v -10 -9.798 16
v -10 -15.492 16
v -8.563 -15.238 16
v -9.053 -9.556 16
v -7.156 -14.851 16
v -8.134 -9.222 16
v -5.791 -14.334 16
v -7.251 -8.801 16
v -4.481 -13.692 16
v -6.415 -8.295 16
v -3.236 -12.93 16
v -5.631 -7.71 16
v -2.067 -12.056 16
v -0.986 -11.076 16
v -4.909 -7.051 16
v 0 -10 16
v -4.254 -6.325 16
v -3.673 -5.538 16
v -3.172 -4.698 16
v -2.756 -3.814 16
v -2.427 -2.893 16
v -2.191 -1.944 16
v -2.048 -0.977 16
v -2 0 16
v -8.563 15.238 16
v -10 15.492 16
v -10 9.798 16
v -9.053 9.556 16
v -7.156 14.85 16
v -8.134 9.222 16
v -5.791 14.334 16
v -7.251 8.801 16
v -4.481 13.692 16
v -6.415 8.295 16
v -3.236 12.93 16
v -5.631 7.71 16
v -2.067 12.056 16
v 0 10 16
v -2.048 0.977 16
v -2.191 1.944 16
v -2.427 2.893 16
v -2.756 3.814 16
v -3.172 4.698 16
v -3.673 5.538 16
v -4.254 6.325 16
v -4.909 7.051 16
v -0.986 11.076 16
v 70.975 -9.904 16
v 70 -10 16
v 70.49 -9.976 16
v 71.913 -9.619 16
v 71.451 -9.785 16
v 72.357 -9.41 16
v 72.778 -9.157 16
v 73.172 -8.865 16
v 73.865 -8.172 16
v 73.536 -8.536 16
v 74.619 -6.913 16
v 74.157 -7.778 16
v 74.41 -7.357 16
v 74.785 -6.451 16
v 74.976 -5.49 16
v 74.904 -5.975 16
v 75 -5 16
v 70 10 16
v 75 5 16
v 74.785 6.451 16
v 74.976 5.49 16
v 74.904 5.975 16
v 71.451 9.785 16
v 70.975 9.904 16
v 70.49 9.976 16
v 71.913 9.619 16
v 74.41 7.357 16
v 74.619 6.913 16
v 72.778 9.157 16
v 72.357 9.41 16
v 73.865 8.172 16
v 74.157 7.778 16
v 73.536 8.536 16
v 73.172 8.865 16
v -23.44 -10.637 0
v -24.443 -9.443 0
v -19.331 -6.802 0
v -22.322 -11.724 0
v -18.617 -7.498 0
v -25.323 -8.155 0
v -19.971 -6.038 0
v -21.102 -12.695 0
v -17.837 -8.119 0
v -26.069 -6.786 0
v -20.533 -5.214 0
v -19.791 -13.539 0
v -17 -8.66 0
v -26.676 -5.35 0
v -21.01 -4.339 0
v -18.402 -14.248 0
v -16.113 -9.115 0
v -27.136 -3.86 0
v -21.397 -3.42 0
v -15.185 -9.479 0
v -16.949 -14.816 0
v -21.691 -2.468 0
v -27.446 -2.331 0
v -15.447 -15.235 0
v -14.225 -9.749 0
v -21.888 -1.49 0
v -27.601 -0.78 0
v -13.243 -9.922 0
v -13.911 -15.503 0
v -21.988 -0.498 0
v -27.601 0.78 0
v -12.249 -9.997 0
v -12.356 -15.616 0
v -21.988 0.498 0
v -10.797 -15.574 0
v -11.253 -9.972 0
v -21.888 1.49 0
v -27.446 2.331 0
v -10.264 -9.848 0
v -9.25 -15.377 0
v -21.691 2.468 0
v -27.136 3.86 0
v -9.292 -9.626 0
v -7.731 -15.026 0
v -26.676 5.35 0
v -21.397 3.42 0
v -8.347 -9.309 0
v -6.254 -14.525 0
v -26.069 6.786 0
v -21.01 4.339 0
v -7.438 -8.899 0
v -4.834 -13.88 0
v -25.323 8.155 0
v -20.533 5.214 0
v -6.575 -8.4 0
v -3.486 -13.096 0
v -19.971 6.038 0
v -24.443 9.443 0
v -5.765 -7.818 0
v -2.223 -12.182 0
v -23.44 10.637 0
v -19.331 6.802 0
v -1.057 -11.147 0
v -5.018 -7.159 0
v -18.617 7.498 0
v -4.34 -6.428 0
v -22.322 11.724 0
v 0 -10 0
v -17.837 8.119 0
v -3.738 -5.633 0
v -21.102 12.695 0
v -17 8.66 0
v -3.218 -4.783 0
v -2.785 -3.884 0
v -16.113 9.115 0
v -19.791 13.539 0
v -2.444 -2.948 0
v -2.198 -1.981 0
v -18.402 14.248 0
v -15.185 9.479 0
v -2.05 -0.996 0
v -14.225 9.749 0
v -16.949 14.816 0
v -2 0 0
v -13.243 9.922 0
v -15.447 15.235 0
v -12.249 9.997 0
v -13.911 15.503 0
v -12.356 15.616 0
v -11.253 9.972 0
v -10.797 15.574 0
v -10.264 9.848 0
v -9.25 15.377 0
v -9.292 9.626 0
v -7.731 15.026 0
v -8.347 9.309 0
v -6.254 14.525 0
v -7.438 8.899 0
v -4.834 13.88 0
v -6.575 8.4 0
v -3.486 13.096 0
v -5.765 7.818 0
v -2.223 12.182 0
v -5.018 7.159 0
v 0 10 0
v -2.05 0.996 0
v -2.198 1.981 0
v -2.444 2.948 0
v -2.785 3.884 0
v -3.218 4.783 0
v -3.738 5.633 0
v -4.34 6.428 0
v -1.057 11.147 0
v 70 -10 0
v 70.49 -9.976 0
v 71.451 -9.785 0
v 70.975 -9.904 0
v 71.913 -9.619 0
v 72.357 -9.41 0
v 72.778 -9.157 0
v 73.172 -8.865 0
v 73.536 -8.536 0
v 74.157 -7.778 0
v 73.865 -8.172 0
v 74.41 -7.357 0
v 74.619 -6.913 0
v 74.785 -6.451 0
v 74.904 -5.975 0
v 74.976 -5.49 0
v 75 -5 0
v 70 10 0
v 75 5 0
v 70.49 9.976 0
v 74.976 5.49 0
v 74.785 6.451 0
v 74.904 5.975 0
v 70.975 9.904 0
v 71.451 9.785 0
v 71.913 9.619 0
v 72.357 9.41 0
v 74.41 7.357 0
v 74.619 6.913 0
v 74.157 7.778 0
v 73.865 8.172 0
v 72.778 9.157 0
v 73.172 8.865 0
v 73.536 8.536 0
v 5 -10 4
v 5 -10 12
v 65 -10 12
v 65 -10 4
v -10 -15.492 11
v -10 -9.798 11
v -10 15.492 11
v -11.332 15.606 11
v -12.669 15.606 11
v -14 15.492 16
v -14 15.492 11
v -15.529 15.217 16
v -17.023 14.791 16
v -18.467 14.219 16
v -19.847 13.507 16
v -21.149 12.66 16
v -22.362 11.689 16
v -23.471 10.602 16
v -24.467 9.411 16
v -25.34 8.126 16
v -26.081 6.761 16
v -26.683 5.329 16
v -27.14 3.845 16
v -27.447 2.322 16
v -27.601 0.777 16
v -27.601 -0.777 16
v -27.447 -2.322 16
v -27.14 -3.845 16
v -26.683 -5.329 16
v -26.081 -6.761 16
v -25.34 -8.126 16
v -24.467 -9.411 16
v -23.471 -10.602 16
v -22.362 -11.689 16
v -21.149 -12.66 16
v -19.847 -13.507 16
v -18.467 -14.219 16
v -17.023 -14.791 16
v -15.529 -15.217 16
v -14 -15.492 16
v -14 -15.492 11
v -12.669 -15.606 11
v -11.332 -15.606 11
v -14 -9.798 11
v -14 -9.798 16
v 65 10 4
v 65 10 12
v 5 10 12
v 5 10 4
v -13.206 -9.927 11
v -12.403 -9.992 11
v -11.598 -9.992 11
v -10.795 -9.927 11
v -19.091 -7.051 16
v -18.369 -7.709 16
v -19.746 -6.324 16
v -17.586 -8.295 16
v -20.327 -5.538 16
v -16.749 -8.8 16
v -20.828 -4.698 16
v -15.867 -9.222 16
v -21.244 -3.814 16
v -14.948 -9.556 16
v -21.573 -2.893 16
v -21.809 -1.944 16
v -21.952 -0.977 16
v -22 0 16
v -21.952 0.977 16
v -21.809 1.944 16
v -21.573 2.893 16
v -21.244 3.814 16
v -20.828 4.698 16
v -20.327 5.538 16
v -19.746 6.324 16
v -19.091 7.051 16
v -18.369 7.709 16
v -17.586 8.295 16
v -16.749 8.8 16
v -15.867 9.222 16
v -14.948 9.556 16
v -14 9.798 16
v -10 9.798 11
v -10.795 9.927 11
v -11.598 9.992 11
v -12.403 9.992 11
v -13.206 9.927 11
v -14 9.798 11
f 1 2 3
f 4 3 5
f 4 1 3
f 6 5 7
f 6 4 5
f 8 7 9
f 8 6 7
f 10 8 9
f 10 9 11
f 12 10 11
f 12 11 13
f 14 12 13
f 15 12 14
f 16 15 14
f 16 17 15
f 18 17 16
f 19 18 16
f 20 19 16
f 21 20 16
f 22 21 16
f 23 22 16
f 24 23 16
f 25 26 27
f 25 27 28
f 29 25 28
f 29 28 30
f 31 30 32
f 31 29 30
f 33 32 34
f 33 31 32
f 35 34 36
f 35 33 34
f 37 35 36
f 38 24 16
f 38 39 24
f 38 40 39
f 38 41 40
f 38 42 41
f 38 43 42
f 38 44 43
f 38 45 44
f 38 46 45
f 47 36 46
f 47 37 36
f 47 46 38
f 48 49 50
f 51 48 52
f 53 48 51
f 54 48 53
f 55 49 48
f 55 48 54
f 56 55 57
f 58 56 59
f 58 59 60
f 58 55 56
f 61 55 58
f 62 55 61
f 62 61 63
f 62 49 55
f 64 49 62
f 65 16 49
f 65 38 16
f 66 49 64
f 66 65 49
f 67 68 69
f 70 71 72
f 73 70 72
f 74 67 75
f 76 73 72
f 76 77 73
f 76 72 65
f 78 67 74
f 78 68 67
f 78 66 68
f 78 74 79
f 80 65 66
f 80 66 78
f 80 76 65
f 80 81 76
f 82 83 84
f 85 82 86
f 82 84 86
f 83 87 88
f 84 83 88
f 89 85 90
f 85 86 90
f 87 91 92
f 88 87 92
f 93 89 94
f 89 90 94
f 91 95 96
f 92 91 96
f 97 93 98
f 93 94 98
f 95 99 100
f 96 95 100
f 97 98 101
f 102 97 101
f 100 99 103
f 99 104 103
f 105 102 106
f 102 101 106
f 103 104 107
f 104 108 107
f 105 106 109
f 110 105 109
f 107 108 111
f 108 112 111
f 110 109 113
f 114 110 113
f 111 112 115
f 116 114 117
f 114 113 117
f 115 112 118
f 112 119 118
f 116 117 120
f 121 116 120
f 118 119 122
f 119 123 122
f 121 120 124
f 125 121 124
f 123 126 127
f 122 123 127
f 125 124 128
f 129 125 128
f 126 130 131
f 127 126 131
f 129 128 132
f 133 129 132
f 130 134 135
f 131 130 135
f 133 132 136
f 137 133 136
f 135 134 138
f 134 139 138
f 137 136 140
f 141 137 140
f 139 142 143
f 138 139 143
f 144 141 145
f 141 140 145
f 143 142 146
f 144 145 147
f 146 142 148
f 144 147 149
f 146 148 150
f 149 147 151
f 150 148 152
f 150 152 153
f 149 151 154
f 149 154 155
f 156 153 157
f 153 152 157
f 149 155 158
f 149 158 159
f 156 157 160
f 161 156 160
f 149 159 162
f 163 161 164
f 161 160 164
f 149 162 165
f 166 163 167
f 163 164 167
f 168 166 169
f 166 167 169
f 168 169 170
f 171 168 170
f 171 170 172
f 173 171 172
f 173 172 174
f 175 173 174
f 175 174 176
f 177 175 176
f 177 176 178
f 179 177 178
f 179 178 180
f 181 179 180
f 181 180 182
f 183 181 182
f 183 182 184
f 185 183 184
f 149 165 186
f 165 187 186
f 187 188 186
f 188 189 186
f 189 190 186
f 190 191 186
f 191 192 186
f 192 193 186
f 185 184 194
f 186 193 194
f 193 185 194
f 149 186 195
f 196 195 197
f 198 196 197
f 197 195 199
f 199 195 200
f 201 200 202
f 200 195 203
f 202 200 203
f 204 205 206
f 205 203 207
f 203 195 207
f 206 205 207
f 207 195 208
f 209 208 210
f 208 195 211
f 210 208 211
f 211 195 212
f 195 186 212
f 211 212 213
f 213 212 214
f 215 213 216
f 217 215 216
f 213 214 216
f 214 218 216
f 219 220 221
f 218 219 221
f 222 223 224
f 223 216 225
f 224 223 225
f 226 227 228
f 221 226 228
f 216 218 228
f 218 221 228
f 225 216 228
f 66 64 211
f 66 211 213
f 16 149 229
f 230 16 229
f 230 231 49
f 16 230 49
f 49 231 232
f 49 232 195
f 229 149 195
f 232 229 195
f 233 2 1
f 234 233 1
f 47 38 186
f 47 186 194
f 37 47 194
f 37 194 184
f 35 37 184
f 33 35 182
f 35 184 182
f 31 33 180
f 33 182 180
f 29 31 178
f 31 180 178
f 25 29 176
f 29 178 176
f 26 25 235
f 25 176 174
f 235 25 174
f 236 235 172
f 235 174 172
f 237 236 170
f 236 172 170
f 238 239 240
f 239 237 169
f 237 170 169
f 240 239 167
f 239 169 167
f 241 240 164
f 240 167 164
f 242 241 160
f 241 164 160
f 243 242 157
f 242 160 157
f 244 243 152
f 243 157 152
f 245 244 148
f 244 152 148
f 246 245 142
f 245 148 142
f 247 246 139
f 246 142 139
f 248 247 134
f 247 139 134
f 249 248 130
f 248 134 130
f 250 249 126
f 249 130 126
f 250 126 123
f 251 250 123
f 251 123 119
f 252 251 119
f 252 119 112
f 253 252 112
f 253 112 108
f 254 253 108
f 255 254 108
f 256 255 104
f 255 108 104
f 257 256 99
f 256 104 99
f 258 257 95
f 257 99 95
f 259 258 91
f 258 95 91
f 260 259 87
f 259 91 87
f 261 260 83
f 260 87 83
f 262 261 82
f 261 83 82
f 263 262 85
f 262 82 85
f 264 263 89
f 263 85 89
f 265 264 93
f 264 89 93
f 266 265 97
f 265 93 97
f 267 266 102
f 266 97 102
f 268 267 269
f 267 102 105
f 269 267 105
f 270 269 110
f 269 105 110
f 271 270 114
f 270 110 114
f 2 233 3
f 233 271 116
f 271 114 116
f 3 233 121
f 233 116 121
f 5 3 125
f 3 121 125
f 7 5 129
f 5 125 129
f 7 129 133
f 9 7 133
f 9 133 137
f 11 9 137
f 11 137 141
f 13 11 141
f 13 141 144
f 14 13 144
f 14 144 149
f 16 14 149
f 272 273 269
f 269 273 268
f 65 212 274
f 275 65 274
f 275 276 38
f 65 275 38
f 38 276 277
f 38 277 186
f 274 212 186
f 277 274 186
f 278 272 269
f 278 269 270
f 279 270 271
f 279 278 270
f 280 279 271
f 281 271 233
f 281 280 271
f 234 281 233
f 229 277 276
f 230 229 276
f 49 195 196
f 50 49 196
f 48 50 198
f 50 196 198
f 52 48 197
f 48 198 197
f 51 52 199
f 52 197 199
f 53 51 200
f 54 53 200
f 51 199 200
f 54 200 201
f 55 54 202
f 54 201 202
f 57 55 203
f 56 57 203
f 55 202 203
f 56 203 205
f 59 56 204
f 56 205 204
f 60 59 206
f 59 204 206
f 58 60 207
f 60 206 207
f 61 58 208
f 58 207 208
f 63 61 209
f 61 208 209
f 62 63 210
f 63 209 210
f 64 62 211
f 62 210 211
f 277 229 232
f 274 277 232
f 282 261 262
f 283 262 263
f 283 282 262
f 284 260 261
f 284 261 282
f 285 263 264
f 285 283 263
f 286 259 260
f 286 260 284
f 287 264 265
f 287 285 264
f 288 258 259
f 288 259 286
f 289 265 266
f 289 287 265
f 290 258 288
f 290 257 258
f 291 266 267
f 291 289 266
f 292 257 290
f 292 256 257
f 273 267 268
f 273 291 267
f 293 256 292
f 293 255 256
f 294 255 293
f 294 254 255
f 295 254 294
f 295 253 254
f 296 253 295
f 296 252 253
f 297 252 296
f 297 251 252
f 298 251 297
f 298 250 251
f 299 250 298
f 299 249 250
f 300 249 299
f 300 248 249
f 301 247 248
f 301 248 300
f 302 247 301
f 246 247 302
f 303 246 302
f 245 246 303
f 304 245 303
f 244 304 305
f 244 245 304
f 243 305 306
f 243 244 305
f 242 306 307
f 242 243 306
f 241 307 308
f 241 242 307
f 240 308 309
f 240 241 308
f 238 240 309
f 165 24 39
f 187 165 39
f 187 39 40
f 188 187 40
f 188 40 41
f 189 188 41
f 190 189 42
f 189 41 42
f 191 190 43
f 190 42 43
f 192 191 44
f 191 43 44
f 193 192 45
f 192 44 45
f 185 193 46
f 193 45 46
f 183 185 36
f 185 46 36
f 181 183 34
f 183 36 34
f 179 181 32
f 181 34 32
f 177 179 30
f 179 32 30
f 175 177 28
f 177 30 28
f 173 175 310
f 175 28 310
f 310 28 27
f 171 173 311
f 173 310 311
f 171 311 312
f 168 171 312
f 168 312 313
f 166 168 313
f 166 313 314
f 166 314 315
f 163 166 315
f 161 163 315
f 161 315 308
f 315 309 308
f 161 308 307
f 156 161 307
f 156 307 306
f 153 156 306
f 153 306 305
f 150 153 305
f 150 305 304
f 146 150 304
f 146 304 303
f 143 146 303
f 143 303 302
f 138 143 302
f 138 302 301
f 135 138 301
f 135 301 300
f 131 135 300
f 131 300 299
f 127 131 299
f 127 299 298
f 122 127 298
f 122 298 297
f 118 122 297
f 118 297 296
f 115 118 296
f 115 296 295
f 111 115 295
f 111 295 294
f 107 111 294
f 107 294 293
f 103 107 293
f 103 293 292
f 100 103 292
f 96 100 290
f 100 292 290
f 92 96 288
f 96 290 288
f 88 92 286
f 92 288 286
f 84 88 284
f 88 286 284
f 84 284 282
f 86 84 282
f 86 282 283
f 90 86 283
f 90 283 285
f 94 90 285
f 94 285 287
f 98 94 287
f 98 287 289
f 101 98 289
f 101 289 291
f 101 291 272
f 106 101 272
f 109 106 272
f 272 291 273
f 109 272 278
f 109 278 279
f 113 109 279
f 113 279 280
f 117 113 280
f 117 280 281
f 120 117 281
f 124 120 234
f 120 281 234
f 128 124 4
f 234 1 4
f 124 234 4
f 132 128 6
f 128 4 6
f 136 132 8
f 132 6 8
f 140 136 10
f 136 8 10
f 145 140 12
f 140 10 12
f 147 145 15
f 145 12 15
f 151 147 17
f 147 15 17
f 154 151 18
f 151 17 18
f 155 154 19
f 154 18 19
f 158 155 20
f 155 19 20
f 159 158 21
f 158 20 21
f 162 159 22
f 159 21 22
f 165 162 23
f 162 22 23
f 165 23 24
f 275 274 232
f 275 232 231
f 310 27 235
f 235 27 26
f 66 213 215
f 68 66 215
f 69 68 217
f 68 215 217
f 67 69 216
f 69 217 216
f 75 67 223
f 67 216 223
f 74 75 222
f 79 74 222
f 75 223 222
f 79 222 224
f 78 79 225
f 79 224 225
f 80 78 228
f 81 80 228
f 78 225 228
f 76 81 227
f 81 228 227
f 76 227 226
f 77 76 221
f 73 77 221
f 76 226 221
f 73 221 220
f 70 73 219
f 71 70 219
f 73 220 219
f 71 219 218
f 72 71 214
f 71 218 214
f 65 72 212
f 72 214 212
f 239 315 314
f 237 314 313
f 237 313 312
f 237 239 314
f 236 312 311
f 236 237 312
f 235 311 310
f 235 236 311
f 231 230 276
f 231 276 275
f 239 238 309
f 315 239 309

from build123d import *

# Parameters (mm, degrees)
F1_DEPTH = 16
F2_R     = 10
F3_DEPTH = 25
F4_W     = 60
F4_H     = 8
F5_DEPTH = 25
F7_DEPTH = 5


with BuildPart() as f1:
    # F0 (on Top) → F1 (new body)
    with BuildSketch(Plane.XY):
        with BuildLine():
            Line((75, -5), (75, 0))
            Line((75, 0), (75, 5))
            ThreePointArc((75, 5), (73.535534, 8.535534), (70, 10))
            Line((70, 10), (0, 10))
            ThreePointArc((0, 10), (-27.620499, 0), (0, -10))
            Line((0, -10), (70, -10))
            ThreePointArc((70, -10), (73.535534, -8.535534), (75, -5))
        make_face()
    extrude(amount=F1_DEPTH)

    # F2 (on face) → F3 (cut)
    with BuildSketch(Plane.XY.offset(16)):
        with Locations((-12, 0)):
            Circle(F2_R)
    extrude(amount=-F3_DEPTH, mode=Mode.SUBTRACT)

    # F4 (on face) → F5 (cut)
    with BuildSketch(Plane.XZ.offset(10)):
        with Locations((35, 8)):
            Rectangle(F4_W, F4_H)
    extrude(amount=-F5_DEPTH, mode=Mode.SUBTRACT)

    # F6 (on face) → F7 (cut)
    with BuildSketch(Plane.XY.offset(16)):
        with BuildLine():
            ThreePointArc((-10.00009, 15.491945), (-12.000217, 15.620499), (-14.000341, 15.491889))
            Line((-14.000341, 15.491889), (-14.000341, 9.797889))
            ThreePointArc((-14.000341, 9.797889), (-12.00022, 10), (-10.00009, 9.797977))
            Line((-10.00009, 9.797977), (-10.00009, 15.491945))
        make_face()
        with BuildLine():
            Line((-14.000341, -9.797889), (-14.000341, -15.491889))
            ThreePointArc((-14.000341, -15.491889), (-12.000344, -15.620499), (-10.000341, -15.491977))
            Line((-10.000341, -15.491977), (-10.00009, -9.797977))
            ThreePointArc((-10.00009, -9.797977), (-12.00022, -10), (-14.000341, -9.797889))
        make_face()
    extrude(amount=-F7_DEPTH, mode=Mode.SUBTRACT)


solid = f1.part
